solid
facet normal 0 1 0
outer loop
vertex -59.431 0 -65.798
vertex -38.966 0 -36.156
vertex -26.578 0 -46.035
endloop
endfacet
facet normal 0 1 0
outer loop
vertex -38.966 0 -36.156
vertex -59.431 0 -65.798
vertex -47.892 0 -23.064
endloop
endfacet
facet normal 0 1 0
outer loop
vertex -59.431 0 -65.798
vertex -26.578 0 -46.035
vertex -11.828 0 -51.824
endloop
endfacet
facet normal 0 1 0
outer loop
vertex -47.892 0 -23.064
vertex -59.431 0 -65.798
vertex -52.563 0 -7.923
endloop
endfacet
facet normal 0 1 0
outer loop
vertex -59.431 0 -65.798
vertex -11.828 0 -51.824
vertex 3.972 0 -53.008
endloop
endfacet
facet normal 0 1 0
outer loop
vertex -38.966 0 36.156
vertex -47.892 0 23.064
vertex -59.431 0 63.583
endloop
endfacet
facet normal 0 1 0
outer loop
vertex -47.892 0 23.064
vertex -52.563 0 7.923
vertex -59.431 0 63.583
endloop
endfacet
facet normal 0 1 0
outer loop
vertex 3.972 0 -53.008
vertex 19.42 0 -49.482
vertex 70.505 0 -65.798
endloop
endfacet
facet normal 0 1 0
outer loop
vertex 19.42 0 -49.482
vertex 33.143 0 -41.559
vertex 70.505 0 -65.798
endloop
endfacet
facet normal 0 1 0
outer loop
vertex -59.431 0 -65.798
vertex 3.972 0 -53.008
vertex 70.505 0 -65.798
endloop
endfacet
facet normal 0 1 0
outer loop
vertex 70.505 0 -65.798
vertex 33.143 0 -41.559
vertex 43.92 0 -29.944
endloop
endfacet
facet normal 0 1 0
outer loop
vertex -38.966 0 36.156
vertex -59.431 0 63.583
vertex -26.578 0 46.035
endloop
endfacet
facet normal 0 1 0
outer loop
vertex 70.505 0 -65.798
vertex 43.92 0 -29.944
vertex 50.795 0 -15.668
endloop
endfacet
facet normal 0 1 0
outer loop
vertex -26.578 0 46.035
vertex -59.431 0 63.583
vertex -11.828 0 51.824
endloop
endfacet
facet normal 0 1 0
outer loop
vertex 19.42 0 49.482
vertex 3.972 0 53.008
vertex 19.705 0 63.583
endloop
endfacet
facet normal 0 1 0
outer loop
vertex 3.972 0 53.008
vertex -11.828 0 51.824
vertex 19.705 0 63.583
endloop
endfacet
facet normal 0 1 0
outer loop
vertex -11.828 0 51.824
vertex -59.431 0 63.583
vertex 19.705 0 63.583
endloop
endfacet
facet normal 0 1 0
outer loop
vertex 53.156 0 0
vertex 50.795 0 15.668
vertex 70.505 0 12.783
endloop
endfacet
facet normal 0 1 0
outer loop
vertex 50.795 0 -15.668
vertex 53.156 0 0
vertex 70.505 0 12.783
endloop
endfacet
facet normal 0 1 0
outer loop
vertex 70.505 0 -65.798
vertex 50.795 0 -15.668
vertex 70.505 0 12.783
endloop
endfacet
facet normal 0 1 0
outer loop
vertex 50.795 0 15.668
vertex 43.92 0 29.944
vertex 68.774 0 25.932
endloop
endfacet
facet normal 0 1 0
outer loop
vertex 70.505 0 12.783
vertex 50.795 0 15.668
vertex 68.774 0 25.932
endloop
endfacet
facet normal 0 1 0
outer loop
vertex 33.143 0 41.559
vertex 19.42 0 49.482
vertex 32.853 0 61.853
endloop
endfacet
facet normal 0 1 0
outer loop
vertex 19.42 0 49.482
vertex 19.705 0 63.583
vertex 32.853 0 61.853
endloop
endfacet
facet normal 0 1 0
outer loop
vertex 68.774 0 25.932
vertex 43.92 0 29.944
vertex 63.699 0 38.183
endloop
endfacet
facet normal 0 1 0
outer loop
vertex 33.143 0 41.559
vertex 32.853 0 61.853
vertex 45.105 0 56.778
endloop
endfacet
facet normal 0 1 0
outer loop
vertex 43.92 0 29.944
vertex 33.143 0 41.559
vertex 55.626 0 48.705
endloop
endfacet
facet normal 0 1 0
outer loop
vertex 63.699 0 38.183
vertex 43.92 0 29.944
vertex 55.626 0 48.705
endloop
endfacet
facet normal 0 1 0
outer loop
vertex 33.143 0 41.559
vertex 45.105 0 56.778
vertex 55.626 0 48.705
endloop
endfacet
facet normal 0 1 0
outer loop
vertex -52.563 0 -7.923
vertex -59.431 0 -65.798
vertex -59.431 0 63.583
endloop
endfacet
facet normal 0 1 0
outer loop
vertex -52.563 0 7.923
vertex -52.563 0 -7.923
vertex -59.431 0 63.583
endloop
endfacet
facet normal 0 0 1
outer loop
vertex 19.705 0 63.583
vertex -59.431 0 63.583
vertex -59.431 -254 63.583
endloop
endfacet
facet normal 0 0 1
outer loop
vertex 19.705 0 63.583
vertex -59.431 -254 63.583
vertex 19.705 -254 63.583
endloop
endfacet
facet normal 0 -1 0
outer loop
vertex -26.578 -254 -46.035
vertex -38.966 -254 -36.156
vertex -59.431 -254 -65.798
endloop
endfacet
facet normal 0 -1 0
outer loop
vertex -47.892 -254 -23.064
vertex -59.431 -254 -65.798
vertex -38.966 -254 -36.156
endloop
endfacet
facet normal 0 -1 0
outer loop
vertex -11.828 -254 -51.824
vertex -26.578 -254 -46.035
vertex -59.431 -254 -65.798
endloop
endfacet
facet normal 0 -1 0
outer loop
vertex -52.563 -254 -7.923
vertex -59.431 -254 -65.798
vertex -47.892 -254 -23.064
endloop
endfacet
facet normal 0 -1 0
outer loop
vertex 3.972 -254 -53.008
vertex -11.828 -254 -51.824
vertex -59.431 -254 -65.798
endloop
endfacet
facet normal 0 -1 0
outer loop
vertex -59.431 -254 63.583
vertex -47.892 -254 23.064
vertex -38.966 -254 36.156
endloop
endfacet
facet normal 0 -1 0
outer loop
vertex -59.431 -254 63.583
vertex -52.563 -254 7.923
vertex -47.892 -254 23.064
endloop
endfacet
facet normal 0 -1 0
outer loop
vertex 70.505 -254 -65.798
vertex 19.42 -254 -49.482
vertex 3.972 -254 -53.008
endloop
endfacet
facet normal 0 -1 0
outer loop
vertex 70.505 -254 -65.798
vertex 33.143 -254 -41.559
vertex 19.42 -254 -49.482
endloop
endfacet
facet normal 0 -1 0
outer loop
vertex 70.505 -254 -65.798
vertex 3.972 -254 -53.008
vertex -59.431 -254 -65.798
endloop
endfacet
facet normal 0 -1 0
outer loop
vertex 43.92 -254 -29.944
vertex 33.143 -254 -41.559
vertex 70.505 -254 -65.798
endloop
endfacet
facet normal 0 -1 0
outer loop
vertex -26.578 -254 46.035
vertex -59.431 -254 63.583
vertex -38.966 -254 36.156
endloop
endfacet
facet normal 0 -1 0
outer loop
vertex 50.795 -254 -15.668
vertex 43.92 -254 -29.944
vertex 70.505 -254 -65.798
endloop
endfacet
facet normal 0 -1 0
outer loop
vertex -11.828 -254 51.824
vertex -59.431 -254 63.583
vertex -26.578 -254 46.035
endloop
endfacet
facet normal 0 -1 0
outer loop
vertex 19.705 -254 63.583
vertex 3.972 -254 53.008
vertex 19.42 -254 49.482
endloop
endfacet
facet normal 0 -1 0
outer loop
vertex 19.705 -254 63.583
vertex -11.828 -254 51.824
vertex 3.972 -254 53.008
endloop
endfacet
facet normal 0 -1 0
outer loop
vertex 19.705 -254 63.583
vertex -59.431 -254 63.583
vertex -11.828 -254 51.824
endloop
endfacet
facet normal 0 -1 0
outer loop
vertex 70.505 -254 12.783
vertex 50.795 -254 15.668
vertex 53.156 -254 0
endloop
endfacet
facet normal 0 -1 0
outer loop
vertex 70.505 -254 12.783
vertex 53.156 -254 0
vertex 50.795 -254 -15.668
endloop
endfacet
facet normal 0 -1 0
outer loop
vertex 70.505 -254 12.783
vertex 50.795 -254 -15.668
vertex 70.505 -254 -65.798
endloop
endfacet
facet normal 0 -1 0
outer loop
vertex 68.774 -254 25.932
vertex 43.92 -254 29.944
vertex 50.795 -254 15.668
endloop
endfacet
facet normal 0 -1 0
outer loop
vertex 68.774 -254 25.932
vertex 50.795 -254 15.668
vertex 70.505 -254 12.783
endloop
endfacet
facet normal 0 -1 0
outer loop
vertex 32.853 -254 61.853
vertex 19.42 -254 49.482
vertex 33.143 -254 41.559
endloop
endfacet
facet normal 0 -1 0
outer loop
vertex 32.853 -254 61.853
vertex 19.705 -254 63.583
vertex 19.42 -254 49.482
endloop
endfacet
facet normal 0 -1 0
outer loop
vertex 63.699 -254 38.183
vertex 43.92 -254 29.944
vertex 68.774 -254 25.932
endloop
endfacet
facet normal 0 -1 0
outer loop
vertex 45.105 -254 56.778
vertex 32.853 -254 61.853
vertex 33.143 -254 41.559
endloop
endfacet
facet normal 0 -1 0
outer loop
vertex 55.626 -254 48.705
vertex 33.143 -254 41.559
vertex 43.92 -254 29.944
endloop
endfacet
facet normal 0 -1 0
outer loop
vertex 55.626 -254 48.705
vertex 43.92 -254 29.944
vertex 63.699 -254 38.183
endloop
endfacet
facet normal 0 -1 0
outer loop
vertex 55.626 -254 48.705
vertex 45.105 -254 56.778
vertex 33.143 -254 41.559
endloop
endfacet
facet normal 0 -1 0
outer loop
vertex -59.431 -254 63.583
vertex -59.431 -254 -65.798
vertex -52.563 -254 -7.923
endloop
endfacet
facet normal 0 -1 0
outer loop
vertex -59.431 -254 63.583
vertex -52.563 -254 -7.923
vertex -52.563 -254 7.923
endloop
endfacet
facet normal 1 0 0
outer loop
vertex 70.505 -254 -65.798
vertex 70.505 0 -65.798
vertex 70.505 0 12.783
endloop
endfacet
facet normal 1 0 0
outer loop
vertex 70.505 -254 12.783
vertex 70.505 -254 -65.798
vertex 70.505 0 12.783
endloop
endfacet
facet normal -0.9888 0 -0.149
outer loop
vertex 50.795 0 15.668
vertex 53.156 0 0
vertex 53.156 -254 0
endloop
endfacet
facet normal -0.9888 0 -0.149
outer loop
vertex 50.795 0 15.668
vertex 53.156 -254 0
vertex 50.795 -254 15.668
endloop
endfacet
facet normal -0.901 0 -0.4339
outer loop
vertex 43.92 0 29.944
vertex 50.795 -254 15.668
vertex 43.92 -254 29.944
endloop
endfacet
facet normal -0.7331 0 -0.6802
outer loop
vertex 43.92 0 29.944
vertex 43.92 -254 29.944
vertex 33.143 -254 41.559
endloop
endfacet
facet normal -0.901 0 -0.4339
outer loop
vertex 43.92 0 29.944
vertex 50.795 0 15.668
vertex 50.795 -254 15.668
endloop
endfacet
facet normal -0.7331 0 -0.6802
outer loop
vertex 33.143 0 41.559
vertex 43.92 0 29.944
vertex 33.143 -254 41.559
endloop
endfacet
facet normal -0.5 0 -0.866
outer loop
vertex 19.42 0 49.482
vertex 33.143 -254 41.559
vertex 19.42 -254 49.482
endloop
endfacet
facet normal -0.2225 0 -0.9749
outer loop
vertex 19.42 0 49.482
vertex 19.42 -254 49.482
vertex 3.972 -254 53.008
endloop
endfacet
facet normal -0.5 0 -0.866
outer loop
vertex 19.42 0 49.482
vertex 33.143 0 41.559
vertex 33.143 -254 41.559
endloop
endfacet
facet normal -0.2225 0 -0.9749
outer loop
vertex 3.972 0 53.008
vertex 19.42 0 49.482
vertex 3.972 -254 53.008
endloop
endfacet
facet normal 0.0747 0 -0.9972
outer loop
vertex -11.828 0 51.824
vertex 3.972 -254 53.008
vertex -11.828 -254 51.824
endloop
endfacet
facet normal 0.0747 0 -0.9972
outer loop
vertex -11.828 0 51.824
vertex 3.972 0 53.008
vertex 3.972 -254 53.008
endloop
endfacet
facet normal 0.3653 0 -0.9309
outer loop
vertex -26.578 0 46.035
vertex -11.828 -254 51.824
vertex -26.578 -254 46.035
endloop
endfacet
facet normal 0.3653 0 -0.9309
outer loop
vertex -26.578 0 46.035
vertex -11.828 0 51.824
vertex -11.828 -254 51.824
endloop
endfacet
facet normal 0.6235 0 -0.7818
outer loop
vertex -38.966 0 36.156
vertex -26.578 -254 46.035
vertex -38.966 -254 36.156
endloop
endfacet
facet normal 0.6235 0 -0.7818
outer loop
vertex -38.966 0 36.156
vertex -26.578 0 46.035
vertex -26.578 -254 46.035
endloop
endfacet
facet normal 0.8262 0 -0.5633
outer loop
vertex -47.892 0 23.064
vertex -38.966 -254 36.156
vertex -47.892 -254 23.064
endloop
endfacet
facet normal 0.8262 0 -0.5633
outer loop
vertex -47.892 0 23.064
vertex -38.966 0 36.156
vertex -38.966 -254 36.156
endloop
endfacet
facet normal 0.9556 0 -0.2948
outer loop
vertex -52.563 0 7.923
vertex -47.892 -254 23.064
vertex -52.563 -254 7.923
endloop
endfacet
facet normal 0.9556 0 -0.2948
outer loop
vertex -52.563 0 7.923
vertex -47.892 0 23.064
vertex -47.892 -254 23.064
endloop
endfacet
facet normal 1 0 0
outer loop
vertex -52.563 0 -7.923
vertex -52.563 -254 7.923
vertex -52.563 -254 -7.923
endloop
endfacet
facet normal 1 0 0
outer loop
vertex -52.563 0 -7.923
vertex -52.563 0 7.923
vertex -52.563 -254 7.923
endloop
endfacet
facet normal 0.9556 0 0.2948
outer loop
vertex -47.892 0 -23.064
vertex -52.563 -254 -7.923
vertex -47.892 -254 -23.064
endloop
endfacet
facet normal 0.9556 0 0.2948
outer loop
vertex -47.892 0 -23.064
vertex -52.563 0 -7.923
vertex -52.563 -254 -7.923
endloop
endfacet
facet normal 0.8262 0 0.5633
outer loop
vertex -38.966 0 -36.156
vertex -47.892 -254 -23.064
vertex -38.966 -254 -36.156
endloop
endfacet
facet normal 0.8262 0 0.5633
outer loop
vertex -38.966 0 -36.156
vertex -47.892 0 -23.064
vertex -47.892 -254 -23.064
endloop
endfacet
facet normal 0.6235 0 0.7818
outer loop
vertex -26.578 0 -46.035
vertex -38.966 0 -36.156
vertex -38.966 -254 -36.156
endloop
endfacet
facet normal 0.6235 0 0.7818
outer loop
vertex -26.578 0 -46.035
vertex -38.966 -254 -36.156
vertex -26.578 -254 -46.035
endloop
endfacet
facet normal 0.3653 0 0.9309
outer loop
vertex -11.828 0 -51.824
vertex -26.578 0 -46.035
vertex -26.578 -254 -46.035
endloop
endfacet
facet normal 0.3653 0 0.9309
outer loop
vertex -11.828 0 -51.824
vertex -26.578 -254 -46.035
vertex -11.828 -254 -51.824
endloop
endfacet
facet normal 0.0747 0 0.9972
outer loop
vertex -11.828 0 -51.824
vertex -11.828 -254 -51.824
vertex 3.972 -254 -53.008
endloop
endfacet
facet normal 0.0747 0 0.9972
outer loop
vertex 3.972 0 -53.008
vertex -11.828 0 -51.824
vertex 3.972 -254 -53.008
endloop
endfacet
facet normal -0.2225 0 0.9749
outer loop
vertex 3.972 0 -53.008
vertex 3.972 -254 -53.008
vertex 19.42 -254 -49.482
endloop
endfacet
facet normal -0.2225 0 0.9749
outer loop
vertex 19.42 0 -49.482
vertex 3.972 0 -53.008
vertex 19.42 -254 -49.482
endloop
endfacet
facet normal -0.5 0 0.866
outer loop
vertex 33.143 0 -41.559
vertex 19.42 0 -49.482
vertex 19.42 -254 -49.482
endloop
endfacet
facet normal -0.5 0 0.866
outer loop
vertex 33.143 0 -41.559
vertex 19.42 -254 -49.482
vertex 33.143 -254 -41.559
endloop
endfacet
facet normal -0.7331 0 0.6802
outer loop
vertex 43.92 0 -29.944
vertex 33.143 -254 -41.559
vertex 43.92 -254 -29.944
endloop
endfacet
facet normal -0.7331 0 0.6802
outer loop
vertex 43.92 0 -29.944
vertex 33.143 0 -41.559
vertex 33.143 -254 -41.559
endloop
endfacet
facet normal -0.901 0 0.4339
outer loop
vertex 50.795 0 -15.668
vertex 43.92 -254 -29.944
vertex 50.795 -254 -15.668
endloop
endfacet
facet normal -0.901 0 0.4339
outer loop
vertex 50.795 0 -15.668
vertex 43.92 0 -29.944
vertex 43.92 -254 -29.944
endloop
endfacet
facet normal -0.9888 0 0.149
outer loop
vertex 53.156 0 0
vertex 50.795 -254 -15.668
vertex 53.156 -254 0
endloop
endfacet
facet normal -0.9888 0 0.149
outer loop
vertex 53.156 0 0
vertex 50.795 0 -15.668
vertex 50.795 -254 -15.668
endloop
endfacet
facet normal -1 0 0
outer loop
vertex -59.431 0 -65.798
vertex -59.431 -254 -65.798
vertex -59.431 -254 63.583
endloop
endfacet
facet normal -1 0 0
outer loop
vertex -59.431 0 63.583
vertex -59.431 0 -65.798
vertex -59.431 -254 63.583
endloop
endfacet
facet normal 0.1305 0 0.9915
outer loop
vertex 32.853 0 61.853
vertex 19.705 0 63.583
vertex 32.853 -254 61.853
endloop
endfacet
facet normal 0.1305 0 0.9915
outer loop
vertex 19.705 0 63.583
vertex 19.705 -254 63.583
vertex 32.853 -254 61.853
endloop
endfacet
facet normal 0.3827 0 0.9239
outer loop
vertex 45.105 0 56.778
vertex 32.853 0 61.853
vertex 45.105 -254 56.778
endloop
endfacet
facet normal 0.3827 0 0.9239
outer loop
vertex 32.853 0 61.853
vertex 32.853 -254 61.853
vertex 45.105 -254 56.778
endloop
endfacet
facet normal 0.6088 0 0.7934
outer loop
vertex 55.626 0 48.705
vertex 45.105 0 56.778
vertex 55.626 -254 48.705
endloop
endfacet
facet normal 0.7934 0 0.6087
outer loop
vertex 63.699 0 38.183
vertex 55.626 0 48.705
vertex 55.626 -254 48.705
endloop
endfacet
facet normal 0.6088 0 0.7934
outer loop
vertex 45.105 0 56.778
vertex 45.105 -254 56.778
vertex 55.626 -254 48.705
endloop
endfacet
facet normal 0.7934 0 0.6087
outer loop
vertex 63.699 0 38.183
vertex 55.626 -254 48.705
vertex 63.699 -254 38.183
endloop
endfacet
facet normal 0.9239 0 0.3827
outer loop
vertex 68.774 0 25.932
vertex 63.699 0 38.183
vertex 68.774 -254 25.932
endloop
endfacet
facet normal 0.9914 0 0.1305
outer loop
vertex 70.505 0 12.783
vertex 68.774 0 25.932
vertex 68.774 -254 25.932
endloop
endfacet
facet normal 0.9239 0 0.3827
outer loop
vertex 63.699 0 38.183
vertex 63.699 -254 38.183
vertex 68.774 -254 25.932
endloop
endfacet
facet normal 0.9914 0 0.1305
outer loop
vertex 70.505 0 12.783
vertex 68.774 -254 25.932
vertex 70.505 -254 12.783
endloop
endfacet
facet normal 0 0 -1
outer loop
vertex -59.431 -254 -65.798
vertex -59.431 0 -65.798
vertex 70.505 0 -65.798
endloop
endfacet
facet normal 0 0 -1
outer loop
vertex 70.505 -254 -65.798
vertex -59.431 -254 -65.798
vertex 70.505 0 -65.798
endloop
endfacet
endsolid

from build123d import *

# Parameters (mm, degrees)
F0_W     = 129.935503
F0_H     = 129.381798
F0_R     = 53.156474
F1_DEPTH = 254
F2_R     = 50.8


with BuildPart() as f1:
    # F0 (on Front) → F1 (new body)
    with BuildSketch(Plane.XZ):
        with Locations((5.537025, -1.107406)):
            Rectangle(F0_W, F0_H)
        Circle(F0_R, mode=Mode.SUBTRACT)
    extrude(amount=F1_DEPTH)

    # F2
    f2_edges = [f1.edges().sort_by_distance(p)[0] for p in [
        (70.504777, -127, 63.583493),
    ]]
    fillet(f2_edges, radius=F2_R)


solid = f1.part
